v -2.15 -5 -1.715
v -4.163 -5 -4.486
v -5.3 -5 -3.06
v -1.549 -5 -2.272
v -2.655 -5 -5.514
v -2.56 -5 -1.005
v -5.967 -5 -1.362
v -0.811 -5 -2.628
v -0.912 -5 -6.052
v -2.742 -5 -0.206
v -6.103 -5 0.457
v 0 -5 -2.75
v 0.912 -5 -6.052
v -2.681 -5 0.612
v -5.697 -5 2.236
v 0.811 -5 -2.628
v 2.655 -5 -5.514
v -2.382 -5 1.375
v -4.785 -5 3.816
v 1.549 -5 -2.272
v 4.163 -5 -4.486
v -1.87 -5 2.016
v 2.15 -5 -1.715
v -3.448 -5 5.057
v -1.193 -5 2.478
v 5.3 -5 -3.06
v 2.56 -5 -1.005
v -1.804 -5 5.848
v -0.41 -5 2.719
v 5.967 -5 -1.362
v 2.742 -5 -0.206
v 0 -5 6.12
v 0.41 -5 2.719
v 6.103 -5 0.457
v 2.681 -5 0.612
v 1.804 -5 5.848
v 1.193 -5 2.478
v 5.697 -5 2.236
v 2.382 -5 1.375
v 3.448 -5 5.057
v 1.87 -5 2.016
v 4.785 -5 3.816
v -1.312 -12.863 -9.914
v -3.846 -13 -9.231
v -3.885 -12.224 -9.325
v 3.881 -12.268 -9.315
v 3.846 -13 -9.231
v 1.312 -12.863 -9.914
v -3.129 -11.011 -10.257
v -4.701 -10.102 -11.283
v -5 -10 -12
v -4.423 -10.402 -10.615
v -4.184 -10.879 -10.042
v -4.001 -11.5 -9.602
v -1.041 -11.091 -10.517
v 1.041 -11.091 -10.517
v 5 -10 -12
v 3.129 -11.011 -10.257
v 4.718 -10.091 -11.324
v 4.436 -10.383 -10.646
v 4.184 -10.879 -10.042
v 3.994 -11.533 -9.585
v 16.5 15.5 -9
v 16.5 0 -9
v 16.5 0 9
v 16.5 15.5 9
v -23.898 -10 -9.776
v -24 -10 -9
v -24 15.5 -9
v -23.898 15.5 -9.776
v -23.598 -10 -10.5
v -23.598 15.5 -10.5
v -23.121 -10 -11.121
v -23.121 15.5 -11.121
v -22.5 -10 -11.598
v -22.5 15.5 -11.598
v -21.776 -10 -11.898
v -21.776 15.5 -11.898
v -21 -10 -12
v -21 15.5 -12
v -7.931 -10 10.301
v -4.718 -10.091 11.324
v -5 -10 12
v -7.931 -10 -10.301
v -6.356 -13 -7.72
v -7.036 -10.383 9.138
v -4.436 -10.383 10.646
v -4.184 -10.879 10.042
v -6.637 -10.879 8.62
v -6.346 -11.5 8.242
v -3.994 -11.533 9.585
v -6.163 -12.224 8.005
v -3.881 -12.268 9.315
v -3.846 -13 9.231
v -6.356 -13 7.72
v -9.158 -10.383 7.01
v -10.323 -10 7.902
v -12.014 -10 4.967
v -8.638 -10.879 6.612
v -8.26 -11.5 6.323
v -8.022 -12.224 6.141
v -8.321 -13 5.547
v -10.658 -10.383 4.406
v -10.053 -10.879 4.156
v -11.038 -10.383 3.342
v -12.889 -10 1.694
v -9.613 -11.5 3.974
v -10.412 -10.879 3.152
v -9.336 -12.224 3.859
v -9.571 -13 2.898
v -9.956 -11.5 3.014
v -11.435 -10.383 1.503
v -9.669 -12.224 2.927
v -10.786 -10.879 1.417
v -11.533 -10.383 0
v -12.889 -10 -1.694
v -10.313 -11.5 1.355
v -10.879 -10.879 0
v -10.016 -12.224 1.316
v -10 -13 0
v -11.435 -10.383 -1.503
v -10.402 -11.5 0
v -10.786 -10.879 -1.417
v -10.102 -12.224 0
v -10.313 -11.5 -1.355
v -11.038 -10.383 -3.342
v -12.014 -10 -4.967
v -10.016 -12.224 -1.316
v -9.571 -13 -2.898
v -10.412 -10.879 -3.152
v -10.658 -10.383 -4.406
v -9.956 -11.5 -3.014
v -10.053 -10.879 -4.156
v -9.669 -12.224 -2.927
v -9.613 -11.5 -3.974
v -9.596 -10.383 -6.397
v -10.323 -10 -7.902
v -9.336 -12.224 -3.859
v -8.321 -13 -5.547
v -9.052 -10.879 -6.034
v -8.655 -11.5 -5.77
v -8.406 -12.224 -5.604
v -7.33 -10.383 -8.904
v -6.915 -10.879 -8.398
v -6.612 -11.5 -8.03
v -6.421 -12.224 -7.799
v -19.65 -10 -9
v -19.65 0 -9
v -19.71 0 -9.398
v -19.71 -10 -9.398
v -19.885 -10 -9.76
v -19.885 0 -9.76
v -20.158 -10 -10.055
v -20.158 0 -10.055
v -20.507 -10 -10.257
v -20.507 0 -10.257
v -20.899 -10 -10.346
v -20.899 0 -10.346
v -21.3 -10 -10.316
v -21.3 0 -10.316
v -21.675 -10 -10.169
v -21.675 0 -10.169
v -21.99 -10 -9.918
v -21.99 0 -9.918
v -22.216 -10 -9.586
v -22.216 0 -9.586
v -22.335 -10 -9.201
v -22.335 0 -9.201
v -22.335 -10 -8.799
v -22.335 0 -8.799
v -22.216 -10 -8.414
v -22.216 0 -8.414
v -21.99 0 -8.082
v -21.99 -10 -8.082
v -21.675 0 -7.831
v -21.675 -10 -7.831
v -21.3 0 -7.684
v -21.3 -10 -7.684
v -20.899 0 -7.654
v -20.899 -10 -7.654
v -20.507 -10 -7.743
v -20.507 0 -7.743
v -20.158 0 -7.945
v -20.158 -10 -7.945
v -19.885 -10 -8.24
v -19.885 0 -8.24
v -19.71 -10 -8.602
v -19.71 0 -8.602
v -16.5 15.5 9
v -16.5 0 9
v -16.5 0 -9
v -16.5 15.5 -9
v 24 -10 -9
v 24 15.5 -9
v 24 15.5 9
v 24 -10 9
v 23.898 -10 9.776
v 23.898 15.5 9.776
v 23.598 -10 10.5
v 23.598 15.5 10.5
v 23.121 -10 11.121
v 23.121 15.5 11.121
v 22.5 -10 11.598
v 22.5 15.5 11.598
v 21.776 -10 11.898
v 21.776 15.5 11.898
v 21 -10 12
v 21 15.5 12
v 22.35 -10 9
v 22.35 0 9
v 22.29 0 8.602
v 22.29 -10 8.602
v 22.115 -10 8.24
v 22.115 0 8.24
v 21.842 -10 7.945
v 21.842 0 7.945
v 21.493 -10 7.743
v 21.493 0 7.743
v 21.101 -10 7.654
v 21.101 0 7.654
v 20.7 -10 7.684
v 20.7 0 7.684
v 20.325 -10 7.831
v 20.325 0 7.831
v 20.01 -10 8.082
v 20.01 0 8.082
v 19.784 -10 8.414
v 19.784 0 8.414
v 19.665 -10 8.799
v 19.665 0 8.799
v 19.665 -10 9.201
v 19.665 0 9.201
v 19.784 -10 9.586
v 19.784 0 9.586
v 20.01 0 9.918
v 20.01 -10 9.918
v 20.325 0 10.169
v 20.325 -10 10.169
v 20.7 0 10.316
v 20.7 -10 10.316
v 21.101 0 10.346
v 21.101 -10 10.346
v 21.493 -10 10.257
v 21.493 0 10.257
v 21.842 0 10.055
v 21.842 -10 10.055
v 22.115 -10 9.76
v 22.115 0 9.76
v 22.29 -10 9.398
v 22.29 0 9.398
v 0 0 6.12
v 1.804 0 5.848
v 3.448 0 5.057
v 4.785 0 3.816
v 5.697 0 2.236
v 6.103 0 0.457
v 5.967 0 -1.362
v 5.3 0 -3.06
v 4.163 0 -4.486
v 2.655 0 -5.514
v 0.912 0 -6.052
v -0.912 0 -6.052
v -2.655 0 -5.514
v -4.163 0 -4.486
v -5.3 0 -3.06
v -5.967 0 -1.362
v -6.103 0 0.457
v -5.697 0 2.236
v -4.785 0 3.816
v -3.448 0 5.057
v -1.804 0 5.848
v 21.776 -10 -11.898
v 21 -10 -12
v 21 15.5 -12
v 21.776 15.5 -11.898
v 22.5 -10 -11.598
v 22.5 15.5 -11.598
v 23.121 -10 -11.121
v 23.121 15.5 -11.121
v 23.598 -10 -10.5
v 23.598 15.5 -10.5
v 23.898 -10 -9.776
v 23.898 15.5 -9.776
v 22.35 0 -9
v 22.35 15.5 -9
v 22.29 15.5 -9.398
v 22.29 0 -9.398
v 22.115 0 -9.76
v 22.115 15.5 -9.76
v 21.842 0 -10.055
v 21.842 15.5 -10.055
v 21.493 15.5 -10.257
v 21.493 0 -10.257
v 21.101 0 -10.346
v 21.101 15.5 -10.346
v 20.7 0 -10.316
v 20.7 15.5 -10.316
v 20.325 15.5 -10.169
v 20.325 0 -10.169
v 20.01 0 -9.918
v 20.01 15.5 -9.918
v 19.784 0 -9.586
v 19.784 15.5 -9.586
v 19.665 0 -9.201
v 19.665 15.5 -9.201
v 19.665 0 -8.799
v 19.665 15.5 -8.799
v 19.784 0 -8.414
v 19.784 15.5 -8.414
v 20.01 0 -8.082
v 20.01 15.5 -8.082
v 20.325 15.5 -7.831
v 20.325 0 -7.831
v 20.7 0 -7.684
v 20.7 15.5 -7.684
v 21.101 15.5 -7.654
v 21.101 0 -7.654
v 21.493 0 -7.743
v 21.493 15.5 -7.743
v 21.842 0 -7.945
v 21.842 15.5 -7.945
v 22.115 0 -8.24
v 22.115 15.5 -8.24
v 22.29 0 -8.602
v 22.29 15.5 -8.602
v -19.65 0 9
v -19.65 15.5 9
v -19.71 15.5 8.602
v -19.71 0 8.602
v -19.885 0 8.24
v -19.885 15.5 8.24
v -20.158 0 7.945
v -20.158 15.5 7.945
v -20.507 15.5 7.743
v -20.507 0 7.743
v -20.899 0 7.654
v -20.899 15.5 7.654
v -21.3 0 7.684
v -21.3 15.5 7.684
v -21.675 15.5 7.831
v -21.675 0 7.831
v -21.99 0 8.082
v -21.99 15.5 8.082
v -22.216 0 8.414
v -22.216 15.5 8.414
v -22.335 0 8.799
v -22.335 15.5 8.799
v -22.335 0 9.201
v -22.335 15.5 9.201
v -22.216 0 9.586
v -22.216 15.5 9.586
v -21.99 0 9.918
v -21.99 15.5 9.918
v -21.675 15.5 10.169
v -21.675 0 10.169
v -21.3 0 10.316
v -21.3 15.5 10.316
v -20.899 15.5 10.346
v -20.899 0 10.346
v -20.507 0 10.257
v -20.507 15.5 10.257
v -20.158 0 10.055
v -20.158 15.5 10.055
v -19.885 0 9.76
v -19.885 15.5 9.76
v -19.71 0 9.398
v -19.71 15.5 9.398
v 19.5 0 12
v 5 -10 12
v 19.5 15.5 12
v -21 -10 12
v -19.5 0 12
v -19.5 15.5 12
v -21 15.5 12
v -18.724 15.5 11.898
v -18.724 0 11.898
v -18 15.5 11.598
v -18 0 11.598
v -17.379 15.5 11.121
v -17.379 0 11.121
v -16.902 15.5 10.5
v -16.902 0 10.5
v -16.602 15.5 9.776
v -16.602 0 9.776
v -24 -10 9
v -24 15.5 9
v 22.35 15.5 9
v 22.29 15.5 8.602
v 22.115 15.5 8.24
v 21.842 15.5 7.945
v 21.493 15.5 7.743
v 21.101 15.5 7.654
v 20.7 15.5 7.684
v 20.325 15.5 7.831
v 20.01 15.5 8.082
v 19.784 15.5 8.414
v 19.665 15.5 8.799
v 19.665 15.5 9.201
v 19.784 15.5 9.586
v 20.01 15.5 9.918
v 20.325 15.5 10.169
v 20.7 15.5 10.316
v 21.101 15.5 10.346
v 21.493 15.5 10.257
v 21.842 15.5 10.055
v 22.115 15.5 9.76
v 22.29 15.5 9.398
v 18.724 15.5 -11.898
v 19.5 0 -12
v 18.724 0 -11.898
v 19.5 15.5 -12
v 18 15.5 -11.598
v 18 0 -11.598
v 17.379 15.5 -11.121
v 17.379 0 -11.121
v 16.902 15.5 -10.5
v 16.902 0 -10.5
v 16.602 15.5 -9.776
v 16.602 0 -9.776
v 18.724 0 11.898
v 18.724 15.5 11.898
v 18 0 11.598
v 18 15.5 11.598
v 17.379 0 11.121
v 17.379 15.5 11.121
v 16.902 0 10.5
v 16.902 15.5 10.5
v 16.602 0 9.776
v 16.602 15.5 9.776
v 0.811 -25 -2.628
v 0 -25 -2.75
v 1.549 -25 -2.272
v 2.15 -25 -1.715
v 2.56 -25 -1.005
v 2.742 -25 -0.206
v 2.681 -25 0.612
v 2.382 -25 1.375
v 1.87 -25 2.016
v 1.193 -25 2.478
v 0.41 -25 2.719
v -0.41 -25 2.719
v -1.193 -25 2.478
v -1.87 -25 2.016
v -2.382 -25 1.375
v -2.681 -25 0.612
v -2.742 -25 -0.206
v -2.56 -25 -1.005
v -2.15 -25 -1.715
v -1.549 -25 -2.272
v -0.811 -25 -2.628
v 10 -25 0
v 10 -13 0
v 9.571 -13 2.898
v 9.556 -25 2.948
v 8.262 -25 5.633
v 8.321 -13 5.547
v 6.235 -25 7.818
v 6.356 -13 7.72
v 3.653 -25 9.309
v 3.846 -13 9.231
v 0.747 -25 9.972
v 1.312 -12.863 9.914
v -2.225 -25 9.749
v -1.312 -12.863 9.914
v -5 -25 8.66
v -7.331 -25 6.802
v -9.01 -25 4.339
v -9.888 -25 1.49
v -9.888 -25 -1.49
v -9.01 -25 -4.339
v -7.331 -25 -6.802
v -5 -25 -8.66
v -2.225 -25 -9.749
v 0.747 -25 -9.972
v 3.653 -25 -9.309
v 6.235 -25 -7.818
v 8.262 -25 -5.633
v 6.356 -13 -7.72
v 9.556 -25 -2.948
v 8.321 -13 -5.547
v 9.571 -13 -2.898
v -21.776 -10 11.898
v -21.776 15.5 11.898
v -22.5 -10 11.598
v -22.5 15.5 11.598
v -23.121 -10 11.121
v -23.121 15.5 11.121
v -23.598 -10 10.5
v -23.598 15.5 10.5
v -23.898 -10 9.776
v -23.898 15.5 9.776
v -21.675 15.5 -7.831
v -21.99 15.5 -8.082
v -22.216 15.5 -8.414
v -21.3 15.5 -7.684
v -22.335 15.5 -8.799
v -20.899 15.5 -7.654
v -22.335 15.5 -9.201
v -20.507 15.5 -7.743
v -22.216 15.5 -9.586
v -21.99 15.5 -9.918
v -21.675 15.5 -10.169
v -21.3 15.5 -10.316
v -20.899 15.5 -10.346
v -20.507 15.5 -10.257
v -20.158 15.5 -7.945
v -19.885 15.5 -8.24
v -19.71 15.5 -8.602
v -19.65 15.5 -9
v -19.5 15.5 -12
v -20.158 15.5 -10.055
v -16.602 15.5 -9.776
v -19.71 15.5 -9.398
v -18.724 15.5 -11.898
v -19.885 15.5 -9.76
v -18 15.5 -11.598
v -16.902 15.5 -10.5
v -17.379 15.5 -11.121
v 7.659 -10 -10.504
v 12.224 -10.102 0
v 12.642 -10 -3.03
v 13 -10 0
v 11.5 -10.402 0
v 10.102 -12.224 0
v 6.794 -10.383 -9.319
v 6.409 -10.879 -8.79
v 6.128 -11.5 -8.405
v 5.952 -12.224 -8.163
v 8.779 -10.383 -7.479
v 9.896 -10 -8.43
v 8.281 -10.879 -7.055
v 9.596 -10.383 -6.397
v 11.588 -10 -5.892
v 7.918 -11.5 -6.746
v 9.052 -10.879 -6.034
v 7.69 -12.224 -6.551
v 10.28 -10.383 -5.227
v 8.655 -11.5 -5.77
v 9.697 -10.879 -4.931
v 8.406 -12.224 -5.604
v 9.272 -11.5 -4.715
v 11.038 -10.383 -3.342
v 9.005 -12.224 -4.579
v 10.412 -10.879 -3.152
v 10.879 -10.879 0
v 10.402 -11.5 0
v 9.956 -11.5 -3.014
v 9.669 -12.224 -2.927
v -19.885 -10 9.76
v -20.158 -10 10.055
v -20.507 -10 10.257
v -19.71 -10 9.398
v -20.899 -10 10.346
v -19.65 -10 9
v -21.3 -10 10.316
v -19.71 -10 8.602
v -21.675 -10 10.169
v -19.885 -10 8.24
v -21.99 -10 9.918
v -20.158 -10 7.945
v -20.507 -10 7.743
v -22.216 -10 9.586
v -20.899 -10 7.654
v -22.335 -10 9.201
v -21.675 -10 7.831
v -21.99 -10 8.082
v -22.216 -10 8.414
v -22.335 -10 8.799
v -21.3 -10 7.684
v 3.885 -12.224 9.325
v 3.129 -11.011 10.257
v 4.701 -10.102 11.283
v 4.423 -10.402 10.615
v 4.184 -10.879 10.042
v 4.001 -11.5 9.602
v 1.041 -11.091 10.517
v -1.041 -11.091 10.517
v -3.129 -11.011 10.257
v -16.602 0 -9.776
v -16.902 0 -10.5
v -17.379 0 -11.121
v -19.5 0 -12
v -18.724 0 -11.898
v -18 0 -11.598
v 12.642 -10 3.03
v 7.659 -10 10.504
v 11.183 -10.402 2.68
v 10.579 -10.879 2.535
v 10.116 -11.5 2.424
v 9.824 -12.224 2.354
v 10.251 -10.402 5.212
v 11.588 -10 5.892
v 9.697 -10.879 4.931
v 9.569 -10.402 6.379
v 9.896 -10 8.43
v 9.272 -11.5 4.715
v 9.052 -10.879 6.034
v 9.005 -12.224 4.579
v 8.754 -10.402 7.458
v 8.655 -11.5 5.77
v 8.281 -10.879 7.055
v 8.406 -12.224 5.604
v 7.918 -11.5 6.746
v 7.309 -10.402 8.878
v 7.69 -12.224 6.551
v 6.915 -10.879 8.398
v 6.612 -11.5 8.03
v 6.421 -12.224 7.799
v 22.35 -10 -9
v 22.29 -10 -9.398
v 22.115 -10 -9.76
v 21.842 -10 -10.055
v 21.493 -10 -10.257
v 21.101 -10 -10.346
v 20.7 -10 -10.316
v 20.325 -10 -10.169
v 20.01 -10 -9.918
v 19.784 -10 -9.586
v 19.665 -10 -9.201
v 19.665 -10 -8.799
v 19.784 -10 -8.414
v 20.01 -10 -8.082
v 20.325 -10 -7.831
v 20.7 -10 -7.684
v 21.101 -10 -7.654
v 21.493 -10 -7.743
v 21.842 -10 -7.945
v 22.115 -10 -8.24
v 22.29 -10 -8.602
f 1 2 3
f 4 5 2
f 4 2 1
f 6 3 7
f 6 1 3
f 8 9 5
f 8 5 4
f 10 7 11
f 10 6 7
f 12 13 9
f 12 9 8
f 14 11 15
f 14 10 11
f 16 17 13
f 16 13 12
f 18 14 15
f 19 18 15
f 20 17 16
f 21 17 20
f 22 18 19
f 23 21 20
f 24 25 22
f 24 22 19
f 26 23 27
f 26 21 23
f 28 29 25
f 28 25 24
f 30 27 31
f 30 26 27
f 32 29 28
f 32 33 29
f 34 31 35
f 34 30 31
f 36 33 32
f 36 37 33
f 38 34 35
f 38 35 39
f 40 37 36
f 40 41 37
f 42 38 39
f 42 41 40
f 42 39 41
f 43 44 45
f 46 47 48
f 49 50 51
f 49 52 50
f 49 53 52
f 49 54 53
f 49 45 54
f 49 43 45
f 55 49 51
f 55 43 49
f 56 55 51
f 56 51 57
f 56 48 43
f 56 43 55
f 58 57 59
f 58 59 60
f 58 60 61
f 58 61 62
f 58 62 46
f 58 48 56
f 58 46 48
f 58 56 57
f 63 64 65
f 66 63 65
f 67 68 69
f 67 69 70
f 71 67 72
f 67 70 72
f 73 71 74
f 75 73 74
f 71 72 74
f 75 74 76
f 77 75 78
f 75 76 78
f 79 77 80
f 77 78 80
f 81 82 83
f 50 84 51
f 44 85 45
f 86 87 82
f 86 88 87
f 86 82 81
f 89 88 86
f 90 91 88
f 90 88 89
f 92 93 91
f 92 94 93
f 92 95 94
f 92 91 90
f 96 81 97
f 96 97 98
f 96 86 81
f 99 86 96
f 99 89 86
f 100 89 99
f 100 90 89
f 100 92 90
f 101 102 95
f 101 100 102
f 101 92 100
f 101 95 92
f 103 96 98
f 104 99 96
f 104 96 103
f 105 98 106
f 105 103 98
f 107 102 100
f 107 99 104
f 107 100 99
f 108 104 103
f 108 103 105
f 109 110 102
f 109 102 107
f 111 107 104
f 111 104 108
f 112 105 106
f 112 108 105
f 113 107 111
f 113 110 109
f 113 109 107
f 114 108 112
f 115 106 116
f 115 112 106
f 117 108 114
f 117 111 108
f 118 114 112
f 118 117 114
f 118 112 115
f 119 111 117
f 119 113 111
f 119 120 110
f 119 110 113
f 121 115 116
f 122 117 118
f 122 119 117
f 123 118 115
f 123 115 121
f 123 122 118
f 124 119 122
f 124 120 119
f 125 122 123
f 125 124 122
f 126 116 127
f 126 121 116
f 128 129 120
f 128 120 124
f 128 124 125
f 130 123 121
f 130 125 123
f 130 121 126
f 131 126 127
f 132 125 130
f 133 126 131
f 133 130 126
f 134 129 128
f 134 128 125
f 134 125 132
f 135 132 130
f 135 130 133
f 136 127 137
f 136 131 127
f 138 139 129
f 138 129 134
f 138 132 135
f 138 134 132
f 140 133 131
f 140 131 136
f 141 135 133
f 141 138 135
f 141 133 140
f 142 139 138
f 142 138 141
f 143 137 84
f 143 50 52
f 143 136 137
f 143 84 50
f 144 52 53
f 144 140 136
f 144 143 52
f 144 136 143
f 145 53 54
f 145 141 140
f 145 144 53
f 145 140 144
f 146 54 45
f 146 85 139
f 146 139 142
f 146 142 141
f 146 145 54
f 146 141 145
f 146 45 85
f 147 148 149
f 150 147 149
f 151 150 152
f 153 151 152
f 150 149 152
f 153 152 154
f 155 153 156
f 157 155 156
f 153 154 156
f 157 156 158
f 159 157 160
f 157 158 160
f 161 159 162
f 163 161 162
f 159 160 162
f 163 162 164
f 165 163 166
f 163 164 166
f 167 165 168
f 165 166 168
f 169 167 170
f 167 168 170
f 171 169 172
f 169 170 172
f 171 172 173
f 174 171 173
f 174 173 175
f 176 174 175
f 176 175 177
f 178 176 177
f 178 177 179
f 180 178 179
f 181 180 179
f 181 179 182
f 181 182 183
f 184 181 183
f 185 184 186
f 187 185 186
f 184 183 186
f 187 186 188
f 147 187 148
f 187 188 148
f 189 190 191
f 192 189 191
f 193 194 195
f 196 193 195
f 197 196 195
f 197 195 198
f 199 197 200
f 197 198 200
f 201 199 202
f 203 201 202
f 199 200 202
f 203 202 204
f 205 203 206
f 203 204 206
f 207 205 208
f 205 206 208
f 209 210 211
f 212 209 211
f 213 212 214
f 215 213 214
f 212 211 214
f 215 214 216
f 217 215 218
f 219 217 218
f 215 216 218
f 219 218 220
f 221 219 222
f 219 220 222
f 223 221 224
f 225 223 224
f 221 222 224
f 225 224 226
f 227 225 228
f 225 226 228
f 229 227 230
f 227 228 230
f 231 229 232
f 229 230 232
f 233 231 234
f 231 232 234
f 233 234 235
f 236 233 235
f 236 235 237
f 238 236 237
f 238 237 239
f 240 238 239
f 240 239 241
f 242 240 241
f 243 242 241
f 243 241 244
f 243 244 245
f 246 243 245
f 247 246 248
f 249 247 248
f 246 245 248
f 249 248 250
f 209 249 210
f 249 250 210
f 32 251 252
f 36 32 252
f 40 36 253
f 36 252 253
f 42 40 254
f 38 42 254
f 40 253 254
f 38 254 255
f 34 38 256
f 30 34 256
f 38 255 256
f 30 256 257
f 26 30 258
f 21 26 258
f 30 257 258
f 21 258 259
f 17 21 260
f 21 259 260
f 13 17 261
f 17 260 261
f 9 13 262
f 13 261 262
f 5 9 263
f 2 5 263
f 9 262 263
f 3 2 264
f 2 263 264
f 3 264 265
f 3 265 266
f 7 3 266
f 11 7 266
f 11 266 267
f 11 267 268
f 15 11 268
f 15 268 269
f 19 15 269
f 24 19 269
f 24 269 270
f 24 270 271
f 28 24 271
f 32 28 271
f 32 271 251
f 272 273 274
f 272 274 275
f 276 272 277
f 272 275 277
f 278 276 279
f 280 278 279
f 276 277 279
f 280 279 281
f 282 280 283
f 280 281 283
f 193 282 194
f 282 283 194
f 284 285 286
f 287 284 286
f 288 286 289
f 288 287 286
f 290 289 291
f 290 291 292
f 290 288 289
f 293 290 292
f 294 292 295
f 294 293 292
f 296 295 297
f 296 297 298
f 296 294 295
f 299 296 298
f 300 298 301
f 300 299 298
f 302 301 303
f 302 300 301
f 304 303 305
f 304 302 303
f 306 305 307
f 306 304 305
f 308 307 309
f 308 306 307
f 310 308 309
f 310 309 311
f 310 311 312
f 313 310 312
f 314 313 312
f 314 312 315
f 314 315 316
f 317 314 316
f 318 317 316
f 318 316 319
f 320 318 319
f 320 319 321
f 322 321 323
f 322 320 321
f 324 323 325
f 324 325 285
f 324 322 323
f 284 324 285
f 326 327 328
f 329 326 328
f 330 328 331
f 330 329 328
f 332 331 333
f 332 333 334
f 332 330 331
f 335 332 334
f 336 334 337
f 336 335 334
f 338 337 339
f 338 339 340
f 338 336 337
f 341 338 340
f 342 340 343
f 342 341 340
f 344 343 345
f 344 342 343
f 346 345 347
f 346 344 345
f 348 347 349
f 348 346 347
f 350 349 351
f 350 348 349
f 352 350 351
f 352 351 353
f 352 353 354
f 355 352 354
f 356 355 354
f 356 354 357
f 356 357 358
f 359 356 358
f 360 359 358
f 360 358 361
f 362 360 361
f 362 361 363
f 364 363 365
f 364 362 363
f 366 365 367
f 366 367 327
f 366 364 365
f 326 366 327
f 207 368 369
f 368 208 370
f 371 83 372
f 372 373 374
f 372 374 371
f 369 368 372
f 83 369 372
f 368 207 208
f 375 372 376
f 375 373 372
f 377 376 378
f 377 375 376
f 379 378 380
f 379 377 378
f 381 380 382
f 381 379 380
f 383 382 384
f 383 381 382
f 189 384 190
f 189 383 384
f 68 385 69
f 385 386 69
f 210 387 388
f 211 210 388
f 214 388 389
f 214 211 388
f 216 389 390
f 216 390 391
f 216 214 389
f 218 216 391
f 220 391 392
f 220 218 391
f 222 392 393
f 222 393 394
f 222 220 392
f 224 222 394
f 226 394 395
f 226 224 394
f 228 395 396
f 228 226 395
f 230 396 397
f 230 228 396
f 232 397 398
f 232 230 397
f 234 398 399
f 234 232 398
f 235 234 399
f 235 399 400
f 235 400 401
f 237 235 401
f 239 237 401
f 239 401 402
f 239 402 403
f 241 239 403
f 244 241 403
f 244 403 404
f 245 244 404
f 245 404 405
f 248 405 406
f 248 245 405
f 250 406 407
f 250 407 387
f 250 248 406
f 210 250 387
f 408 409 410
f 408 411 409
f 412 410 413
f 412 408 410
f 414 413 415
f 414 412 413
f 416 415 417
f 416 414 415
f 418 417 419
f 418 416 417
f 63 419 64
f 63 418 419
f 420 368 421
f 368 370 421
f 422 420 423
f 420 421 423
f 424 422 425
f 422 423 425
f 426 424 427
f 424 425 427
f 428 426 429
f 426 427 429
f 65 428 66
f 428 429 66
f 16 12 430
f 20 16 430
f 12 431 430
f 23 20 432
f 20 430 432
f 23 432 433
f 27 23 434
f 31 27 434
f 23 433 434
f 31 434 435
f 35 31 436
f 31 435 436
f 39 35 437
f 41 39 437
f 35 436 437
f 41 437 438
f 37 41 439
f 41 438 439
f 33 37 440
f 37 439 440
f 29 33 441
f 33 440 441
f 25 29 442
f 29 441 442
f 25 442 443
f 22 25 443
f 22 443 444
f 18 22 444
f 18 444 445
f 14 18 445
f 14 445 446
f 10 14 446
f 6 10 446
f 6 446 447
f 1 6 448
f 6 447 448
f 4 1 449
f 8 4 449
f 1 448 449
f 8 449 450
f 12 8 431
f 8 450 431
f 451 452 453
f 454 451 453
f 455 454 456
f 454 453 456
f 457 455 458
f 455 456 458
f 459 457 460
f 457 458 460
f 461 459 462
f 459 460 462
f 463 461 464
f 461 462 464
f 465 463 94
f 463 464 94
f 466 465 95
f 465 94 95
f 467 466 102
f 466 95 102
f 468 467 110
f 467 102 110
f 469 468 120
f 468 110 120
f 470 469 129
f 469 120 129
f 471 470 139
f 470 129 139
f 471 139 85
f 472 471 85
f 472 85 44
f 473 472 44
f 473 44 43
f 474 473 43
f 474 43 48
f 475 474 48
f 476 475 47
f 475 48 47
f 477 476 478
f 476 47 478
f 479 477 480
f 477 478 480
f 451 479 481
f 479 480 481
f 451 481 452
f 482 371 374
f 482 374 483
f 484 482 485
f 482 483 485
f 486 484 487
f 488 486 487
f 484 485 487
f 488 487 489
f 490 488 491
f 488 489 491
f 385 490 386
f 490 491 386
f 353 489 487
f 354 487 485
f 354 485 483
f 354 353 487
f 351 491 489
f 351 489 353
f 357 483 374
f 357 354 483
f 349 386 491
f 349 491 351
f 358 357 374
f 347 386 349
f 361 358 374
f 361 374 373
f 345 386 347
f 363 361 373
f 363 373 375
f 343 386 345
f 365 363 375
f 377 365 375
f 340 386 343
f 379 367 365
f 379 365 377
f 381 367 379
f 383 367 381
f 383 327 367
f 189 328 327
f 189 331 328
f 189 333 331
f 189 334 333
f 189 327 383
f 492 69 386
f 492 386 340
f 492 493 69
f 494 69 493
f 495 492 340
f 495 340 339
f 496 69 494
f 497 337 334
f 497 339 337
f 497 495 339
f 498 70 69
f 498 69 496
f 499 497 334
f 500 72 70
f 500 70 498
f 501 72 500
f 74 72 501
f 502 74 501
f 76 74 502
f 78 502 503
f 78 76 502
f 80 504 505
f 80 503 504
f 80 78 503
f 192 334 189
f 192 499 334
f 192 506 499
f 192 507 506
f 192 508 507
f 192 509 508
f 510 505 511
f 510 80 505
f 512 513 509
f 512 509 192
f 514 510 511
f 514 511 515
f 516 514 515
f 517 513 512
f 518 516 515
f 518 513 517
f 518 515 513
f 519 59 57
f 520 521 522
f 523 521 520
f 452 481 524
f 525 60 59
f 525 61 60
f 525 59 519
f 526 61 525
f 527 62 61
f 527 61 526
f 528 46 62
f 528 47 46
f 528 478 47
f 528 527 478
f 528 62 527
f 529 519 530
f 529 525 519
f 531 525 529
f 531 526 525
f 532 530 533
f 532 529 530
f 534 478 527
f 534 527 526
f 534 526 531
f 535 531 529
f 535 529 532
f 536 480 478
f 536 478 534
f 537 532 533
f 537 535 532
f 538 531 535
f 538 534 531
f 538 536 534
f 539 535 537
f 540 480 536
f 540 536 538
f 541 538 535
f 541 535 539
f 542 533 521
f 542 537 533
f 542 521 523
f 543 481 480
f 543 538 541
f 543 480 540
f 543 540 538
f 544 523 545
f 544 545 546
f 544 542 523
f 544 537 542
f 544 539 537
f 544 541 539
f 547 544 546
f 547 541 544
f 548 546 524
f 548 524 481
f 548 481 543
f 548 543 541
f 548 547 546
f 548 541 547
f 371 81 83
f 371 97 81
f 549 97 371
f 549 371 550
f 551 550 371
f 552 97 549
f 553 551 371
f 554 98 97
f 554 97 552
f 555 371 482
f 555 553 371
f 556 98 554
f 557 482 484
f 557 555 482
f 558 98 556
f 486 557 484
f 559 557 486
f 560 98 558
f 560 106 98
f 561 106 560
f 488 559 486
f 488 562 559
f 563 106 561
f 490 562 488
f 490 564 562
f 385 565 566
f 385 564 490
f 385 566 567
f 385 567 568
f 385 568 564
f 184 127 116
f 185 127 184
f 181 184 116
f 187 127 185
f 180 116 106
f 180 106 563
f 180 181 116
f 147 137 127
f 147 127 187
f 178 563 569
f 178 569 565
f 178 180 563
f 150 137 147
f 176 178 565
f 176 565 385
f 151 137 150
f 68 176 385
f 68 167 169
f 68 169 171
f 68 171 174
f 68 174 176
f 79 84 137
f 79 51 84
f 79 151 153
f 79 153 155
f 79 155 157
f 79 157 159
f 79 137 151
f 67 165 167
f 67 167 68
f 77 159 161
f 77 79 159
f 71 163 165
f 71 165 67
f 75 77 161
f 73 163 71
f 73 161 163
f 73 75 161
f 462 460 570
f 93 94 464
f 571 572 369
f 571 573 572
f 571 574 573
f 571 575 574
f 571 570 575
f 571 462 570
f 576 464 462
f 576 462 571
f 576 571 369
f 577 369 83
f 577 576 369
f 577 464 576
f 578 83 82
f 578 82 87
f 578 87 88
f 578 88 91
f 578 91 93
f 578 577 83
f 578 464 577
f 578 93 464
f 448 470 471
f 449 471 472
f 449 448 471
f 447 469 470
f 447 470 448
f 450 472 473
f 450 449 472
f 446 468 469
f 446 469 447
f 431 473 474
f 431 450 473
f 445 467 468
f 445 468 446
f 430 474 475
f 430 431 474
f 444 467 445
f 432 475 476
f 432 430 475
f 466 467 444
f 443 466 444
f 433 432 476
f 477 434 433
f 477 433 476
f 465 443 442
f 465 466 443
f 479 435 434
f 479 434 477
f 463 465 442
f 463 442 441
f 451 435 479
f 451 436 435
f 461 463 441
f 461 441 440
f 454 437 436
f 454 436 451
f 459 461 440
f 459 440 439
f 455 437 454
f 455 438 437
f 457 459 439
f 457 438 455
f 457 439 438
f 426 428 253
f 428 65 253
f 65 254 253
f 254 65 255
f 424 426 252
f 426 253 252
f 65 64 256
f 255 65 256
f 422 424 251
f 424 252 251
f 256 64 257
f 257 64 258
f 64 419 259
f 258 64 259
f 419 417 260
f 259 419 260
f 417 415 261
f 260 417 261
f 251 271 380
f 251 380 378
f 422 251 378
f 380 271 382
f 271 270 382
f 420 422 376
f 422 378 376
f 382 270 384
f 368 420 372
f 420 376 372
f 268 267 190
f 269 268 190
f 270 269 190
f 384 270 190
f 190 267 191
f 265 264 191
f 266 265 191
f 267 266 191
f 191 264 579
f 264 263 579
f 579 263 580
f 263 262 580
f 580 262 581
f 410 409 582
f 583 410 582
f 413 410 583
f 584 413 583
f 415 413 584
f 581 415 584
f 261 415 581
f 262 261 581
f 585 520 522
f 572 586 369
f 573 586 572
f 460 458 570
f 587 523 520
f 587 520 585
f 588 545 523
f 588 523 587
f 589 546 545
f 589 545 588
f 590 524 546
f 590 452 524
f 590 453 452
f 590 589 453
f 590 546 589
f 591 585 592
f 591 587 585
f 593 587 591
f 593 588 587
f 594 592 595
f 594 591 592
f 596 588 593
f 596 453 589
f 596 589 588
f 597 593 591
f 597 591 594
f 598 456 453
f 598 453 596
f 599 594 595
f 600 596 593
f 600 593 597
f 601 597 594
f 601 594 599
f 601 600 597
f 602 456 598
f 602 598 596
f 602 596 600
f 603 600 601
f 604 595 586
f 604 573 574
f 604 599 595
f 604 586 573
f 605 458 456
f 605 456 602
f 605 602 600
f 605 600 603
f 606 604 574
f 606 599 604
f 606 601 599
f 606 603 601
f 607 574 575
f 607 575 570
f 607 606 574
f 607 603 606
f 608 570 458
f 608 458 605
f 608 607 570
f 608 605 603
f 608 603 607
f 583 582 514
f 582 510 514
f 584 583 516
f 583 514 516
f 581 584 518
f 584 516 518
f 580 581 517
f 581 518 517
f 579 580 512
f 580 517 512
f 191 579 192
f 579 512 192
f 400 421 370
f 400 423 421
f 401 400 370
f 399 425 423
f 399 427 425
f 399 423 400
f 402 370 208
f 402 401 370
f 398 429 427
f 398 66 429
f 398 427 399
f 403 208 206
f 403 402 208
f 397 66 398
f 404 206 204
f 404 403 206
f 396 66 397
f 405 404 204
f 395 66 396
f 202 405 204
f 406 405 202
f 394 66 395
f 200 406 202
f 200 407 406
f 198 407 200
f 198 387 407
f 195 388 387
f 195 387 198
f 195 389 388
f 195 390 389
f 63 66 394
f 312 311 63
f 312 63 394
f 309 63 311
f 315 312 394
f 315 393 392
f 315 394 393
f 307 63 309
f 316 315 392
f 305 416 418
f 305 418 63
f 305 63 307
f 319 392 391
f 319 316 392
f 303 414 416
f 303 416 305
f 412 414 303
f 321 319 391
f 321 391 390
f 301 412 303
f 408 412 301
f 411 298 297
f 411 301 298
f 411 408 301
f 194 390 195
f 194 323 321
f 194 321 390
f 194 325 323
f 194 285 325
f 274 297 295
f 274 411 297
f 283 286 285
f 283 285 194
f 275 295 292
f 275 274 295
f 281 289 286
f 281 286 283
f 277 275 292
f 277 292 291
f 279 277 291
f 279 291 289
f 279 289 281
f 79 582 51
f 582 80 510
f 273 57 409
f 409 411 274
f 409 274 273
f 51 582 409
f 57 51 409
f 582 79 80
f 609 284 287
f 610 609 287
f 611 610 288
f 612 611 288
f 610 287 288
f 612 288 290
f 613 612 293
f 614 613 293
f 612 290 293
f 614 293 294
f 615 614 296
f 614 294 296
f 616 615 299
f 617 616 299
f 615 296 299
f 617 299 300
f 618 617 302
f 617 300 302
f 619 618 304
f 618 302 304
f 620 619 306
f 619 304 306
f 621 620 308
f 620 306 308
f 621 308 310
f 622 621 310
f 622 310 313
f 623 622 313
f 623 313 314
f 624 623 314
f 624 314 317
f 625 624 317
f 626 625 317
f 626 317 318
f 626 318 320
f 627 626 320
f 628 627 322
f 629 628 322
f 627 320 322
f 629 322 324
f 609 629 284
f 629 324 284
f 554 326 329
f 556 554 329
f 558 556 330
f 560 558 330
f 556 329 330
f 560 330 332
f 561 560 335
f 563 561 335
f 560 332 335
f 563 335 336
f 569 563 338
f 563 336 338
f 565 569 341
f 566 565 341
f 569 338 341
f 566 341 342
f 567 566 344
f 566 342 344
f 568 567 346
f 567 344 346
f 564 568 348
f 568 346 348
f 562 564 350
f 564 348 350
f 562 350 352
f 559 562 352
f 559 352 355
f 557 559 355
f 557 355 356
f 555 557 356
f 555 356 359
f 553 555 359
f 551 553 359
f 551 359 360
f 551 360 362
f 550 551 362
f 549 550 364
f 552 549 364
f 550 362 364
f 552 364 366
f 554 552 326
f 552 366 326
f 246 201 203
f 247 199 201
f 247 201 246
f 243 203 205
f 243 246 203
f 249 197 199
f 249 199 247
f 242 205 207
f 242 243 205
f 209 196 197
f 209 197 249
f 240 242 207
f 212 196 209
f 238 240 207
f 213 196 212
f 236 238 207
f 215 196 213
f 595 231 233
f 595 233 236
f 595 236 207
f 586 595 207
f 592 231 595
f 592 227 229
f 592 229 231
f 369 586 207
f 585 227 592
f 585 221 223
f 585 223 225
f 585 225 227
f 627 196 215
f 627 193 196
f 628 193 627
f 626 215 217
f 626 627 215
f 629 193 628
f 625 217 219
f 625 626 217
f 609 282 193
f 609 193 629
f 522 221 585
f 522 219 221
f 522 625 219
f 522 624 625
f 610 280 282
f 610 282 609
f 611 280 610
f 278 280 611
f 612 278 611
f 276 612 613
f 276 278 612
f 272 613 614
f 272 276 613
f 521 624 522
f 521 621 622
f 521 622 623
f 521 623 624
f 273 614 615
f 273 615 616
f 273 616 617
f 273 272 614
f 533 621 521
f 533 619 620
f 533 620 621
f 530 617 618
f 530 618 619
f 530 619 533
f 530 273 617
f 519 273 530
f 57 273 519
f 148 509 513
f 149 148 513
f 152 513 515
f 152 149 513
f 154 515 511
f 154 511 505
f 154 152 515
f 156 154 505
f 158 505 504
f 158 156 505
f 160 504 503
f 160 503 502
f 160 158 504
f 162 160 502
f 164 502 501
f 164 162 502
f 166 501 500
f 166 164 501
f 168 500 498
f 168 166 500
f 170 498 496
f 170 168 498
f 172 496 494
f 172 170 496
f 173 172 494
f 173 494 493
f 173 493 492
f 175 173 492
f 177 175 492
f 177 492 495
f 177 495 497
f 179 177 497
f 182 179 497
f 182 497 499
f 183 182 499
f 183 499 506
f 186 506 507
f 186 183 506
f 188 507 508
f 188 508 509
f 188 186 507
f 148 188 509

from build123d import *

# Parameters (mm, degrees)
SKETCH1_R                               = 1.35
BOSS_EXTRUDE1_DEPTH                     = 15.5
BOSS_EXTRUDE1_2_DEPTH                   = 15.5
SKETCH2_R                               = 1.35
BOSS_EXTRUDE2_DEPTH                     = 10
SKETCH4_R                               = 10
BOSS_EXTRUDE3_DEPTH                     = 15
CBORE_FOR_M5_HEX_HEAD_BOLT1_D           = 5.5
CBORE_FOR_M5_HEX_HEAD_BOLT1_CBORE_D     = 12.24
CBORE_FOR_M5_HEX_HEAD_BOLT1_CBORE_DEPTH = 5
FILLET1_R                               = 3


with BuildPart() as part:
    # Sketch1 → Boss-Extrude1 (new body)
    with BuildSketch(Plane(origin=(0, 0, 0), x_dir=(1, 0, 0), z_dir=(0, 1, 0))):
        with BuildLine():
            Line((21, 12), (16.5, 12))
            Line((16.5, 12), (16.5, -12))
            Line((16.5, -12), (21, -12))
            ThreePointArc((21, -12), (23.121320344, -11.121320344), (24, -9))
            Line((24, -9), (24, 9))
            ThreePointArc((24, 9), (23.121320344, 11.121320344), (21, 12))
        make_face()
        with Locations((21, -9)):
            Circle(SKETCH1_R, mode=Mode.SUBTRACT)
        with Locations((21, 9)):
            Circle(SKETCH1_R, mode=Mode.SUBTRACT)
    extrude(amount=BOSS_EXTRUDE1_DEPTH)



with BuildPart() as body_2:
    # Sketch1 → Boss-Extrude1 2 (new body)
    with BuildSketch(Plane(origin=(0, 0, 0), x_dir=(1, 0, 0), z_dir=(0, 1, 0))):
        with BuildLine():
            Line((-16.5, 12), (-21, 12))
            ThreePointArc((-21, 12), (-23.121320344, 11.121320344), (-24, 9))
            Line((-24, 9), (-24, -9))
            ThreePointArc((-24, -9), (-23.121320344, -11.121320344), (-21, -12))
            Line((-21, -12), (-16.5, -12))
            Line((-16.5, -12), (-16.5, 12))
        make_face()
        with Locations((-21, -9)):
            Circle(SKETCH1_R, mode=Mode.SUBTRACT)
        with Locations((-21, 9)):
            Circle(SKETCH1_R, mode=Mode.SUBTRACT)
    extrude(amount=BOSS_EXTRUDE1_2_DEPTH)


with BuildPart() as part_1:
    add(part.part)

    add(body_2.part)  # Boss-Extrude2 merges body 2
    # Sketch2 → Boss-Extrude2 (add)
    with BuildSketch(Plane(origin=(0, 0, 0), x_dir=(1, 0, 0), z_dir=(0, 1, 0))):
        with BuildLine():
            Line((24, 9), (24, -9))
            ThreePointArc((24, -9), (23.121320344, -11.121320344), (21, -12))
            Line((21, -12), (16.5, -12))
            Line((16.5, -12), (-16.5, -12))
            Line((-16.5, -12), (-21, -12))
            ThreePointArc((-21, -12), (-23.121320344, -11.121320344), (-24, -9))
            Line((-24, -9), (-24, 9))
            ThreePointArc((-24, 9), (-23.121320344, 11.121320344), (-21, 12))
            Line((-21, 12), (-16.5, 12))
            Line((-16.5, 12), (16.5, 12))
            Line((16.5, 12), (21, 12))
            ThreePointArc((21, 12), (23.121320344, 11.121320344), (24, 9))
        make_face()
        with Locations((21, 9)):
            Circle(SKETCH2_R, mode=Mode.SUBTRACT)
        with Locations((21, -9)):
            Circle(SKETCH2_R, mode=Mode.SUBTRACT)
        with Locations((-21, 9)):
            Circle(SKETCH2_R, mode=Mode.SUBTRACT)
        with Locations((-21, -9)):
            Circle(SKETCH2_R, mode=Mode.SUBTRACT)
    extrude(amount=-BOSS_EXTRUDE2_DEPTH)

    # Sketch4 → Boss-Extrude3 (add)
    with BuildSketch(Plane.XZ.offset(10)):
        Circle(SKETCH4_R)
    extrude(amount=BOSS_EXTRUDE3_DEPTH)

    # CBORE for M5 Hex Head Bolt1 (through all)
    with Locations(Plane.ZX):
        with Locations((0, 0)):
            CounterBoreHole(CBORE_FOR_M5_HEX_HEAD_BOLT1_D / 2, CBORE_FOR_M5_HEX_HEAD_BOLT1_CBORE_D / 2, CBORE_FOR_M5_HEX_HEAD_BOLT1_CBORE_DEPTH)

    # Fillet1
    fillet1_edges = [part_1.edges().sort_by_distance(p)[0] for p in [
        (-16.5, 7.75, -12),
        (-16.5, 7.75, 12),
        (16.5, 7.75, -12),
        (16.5, 7.75, 12),
        (-10, -10, 0),
    ]]
    fillet(fillet1_edges, radius=FILLET1_R)


solid = part_1.part
